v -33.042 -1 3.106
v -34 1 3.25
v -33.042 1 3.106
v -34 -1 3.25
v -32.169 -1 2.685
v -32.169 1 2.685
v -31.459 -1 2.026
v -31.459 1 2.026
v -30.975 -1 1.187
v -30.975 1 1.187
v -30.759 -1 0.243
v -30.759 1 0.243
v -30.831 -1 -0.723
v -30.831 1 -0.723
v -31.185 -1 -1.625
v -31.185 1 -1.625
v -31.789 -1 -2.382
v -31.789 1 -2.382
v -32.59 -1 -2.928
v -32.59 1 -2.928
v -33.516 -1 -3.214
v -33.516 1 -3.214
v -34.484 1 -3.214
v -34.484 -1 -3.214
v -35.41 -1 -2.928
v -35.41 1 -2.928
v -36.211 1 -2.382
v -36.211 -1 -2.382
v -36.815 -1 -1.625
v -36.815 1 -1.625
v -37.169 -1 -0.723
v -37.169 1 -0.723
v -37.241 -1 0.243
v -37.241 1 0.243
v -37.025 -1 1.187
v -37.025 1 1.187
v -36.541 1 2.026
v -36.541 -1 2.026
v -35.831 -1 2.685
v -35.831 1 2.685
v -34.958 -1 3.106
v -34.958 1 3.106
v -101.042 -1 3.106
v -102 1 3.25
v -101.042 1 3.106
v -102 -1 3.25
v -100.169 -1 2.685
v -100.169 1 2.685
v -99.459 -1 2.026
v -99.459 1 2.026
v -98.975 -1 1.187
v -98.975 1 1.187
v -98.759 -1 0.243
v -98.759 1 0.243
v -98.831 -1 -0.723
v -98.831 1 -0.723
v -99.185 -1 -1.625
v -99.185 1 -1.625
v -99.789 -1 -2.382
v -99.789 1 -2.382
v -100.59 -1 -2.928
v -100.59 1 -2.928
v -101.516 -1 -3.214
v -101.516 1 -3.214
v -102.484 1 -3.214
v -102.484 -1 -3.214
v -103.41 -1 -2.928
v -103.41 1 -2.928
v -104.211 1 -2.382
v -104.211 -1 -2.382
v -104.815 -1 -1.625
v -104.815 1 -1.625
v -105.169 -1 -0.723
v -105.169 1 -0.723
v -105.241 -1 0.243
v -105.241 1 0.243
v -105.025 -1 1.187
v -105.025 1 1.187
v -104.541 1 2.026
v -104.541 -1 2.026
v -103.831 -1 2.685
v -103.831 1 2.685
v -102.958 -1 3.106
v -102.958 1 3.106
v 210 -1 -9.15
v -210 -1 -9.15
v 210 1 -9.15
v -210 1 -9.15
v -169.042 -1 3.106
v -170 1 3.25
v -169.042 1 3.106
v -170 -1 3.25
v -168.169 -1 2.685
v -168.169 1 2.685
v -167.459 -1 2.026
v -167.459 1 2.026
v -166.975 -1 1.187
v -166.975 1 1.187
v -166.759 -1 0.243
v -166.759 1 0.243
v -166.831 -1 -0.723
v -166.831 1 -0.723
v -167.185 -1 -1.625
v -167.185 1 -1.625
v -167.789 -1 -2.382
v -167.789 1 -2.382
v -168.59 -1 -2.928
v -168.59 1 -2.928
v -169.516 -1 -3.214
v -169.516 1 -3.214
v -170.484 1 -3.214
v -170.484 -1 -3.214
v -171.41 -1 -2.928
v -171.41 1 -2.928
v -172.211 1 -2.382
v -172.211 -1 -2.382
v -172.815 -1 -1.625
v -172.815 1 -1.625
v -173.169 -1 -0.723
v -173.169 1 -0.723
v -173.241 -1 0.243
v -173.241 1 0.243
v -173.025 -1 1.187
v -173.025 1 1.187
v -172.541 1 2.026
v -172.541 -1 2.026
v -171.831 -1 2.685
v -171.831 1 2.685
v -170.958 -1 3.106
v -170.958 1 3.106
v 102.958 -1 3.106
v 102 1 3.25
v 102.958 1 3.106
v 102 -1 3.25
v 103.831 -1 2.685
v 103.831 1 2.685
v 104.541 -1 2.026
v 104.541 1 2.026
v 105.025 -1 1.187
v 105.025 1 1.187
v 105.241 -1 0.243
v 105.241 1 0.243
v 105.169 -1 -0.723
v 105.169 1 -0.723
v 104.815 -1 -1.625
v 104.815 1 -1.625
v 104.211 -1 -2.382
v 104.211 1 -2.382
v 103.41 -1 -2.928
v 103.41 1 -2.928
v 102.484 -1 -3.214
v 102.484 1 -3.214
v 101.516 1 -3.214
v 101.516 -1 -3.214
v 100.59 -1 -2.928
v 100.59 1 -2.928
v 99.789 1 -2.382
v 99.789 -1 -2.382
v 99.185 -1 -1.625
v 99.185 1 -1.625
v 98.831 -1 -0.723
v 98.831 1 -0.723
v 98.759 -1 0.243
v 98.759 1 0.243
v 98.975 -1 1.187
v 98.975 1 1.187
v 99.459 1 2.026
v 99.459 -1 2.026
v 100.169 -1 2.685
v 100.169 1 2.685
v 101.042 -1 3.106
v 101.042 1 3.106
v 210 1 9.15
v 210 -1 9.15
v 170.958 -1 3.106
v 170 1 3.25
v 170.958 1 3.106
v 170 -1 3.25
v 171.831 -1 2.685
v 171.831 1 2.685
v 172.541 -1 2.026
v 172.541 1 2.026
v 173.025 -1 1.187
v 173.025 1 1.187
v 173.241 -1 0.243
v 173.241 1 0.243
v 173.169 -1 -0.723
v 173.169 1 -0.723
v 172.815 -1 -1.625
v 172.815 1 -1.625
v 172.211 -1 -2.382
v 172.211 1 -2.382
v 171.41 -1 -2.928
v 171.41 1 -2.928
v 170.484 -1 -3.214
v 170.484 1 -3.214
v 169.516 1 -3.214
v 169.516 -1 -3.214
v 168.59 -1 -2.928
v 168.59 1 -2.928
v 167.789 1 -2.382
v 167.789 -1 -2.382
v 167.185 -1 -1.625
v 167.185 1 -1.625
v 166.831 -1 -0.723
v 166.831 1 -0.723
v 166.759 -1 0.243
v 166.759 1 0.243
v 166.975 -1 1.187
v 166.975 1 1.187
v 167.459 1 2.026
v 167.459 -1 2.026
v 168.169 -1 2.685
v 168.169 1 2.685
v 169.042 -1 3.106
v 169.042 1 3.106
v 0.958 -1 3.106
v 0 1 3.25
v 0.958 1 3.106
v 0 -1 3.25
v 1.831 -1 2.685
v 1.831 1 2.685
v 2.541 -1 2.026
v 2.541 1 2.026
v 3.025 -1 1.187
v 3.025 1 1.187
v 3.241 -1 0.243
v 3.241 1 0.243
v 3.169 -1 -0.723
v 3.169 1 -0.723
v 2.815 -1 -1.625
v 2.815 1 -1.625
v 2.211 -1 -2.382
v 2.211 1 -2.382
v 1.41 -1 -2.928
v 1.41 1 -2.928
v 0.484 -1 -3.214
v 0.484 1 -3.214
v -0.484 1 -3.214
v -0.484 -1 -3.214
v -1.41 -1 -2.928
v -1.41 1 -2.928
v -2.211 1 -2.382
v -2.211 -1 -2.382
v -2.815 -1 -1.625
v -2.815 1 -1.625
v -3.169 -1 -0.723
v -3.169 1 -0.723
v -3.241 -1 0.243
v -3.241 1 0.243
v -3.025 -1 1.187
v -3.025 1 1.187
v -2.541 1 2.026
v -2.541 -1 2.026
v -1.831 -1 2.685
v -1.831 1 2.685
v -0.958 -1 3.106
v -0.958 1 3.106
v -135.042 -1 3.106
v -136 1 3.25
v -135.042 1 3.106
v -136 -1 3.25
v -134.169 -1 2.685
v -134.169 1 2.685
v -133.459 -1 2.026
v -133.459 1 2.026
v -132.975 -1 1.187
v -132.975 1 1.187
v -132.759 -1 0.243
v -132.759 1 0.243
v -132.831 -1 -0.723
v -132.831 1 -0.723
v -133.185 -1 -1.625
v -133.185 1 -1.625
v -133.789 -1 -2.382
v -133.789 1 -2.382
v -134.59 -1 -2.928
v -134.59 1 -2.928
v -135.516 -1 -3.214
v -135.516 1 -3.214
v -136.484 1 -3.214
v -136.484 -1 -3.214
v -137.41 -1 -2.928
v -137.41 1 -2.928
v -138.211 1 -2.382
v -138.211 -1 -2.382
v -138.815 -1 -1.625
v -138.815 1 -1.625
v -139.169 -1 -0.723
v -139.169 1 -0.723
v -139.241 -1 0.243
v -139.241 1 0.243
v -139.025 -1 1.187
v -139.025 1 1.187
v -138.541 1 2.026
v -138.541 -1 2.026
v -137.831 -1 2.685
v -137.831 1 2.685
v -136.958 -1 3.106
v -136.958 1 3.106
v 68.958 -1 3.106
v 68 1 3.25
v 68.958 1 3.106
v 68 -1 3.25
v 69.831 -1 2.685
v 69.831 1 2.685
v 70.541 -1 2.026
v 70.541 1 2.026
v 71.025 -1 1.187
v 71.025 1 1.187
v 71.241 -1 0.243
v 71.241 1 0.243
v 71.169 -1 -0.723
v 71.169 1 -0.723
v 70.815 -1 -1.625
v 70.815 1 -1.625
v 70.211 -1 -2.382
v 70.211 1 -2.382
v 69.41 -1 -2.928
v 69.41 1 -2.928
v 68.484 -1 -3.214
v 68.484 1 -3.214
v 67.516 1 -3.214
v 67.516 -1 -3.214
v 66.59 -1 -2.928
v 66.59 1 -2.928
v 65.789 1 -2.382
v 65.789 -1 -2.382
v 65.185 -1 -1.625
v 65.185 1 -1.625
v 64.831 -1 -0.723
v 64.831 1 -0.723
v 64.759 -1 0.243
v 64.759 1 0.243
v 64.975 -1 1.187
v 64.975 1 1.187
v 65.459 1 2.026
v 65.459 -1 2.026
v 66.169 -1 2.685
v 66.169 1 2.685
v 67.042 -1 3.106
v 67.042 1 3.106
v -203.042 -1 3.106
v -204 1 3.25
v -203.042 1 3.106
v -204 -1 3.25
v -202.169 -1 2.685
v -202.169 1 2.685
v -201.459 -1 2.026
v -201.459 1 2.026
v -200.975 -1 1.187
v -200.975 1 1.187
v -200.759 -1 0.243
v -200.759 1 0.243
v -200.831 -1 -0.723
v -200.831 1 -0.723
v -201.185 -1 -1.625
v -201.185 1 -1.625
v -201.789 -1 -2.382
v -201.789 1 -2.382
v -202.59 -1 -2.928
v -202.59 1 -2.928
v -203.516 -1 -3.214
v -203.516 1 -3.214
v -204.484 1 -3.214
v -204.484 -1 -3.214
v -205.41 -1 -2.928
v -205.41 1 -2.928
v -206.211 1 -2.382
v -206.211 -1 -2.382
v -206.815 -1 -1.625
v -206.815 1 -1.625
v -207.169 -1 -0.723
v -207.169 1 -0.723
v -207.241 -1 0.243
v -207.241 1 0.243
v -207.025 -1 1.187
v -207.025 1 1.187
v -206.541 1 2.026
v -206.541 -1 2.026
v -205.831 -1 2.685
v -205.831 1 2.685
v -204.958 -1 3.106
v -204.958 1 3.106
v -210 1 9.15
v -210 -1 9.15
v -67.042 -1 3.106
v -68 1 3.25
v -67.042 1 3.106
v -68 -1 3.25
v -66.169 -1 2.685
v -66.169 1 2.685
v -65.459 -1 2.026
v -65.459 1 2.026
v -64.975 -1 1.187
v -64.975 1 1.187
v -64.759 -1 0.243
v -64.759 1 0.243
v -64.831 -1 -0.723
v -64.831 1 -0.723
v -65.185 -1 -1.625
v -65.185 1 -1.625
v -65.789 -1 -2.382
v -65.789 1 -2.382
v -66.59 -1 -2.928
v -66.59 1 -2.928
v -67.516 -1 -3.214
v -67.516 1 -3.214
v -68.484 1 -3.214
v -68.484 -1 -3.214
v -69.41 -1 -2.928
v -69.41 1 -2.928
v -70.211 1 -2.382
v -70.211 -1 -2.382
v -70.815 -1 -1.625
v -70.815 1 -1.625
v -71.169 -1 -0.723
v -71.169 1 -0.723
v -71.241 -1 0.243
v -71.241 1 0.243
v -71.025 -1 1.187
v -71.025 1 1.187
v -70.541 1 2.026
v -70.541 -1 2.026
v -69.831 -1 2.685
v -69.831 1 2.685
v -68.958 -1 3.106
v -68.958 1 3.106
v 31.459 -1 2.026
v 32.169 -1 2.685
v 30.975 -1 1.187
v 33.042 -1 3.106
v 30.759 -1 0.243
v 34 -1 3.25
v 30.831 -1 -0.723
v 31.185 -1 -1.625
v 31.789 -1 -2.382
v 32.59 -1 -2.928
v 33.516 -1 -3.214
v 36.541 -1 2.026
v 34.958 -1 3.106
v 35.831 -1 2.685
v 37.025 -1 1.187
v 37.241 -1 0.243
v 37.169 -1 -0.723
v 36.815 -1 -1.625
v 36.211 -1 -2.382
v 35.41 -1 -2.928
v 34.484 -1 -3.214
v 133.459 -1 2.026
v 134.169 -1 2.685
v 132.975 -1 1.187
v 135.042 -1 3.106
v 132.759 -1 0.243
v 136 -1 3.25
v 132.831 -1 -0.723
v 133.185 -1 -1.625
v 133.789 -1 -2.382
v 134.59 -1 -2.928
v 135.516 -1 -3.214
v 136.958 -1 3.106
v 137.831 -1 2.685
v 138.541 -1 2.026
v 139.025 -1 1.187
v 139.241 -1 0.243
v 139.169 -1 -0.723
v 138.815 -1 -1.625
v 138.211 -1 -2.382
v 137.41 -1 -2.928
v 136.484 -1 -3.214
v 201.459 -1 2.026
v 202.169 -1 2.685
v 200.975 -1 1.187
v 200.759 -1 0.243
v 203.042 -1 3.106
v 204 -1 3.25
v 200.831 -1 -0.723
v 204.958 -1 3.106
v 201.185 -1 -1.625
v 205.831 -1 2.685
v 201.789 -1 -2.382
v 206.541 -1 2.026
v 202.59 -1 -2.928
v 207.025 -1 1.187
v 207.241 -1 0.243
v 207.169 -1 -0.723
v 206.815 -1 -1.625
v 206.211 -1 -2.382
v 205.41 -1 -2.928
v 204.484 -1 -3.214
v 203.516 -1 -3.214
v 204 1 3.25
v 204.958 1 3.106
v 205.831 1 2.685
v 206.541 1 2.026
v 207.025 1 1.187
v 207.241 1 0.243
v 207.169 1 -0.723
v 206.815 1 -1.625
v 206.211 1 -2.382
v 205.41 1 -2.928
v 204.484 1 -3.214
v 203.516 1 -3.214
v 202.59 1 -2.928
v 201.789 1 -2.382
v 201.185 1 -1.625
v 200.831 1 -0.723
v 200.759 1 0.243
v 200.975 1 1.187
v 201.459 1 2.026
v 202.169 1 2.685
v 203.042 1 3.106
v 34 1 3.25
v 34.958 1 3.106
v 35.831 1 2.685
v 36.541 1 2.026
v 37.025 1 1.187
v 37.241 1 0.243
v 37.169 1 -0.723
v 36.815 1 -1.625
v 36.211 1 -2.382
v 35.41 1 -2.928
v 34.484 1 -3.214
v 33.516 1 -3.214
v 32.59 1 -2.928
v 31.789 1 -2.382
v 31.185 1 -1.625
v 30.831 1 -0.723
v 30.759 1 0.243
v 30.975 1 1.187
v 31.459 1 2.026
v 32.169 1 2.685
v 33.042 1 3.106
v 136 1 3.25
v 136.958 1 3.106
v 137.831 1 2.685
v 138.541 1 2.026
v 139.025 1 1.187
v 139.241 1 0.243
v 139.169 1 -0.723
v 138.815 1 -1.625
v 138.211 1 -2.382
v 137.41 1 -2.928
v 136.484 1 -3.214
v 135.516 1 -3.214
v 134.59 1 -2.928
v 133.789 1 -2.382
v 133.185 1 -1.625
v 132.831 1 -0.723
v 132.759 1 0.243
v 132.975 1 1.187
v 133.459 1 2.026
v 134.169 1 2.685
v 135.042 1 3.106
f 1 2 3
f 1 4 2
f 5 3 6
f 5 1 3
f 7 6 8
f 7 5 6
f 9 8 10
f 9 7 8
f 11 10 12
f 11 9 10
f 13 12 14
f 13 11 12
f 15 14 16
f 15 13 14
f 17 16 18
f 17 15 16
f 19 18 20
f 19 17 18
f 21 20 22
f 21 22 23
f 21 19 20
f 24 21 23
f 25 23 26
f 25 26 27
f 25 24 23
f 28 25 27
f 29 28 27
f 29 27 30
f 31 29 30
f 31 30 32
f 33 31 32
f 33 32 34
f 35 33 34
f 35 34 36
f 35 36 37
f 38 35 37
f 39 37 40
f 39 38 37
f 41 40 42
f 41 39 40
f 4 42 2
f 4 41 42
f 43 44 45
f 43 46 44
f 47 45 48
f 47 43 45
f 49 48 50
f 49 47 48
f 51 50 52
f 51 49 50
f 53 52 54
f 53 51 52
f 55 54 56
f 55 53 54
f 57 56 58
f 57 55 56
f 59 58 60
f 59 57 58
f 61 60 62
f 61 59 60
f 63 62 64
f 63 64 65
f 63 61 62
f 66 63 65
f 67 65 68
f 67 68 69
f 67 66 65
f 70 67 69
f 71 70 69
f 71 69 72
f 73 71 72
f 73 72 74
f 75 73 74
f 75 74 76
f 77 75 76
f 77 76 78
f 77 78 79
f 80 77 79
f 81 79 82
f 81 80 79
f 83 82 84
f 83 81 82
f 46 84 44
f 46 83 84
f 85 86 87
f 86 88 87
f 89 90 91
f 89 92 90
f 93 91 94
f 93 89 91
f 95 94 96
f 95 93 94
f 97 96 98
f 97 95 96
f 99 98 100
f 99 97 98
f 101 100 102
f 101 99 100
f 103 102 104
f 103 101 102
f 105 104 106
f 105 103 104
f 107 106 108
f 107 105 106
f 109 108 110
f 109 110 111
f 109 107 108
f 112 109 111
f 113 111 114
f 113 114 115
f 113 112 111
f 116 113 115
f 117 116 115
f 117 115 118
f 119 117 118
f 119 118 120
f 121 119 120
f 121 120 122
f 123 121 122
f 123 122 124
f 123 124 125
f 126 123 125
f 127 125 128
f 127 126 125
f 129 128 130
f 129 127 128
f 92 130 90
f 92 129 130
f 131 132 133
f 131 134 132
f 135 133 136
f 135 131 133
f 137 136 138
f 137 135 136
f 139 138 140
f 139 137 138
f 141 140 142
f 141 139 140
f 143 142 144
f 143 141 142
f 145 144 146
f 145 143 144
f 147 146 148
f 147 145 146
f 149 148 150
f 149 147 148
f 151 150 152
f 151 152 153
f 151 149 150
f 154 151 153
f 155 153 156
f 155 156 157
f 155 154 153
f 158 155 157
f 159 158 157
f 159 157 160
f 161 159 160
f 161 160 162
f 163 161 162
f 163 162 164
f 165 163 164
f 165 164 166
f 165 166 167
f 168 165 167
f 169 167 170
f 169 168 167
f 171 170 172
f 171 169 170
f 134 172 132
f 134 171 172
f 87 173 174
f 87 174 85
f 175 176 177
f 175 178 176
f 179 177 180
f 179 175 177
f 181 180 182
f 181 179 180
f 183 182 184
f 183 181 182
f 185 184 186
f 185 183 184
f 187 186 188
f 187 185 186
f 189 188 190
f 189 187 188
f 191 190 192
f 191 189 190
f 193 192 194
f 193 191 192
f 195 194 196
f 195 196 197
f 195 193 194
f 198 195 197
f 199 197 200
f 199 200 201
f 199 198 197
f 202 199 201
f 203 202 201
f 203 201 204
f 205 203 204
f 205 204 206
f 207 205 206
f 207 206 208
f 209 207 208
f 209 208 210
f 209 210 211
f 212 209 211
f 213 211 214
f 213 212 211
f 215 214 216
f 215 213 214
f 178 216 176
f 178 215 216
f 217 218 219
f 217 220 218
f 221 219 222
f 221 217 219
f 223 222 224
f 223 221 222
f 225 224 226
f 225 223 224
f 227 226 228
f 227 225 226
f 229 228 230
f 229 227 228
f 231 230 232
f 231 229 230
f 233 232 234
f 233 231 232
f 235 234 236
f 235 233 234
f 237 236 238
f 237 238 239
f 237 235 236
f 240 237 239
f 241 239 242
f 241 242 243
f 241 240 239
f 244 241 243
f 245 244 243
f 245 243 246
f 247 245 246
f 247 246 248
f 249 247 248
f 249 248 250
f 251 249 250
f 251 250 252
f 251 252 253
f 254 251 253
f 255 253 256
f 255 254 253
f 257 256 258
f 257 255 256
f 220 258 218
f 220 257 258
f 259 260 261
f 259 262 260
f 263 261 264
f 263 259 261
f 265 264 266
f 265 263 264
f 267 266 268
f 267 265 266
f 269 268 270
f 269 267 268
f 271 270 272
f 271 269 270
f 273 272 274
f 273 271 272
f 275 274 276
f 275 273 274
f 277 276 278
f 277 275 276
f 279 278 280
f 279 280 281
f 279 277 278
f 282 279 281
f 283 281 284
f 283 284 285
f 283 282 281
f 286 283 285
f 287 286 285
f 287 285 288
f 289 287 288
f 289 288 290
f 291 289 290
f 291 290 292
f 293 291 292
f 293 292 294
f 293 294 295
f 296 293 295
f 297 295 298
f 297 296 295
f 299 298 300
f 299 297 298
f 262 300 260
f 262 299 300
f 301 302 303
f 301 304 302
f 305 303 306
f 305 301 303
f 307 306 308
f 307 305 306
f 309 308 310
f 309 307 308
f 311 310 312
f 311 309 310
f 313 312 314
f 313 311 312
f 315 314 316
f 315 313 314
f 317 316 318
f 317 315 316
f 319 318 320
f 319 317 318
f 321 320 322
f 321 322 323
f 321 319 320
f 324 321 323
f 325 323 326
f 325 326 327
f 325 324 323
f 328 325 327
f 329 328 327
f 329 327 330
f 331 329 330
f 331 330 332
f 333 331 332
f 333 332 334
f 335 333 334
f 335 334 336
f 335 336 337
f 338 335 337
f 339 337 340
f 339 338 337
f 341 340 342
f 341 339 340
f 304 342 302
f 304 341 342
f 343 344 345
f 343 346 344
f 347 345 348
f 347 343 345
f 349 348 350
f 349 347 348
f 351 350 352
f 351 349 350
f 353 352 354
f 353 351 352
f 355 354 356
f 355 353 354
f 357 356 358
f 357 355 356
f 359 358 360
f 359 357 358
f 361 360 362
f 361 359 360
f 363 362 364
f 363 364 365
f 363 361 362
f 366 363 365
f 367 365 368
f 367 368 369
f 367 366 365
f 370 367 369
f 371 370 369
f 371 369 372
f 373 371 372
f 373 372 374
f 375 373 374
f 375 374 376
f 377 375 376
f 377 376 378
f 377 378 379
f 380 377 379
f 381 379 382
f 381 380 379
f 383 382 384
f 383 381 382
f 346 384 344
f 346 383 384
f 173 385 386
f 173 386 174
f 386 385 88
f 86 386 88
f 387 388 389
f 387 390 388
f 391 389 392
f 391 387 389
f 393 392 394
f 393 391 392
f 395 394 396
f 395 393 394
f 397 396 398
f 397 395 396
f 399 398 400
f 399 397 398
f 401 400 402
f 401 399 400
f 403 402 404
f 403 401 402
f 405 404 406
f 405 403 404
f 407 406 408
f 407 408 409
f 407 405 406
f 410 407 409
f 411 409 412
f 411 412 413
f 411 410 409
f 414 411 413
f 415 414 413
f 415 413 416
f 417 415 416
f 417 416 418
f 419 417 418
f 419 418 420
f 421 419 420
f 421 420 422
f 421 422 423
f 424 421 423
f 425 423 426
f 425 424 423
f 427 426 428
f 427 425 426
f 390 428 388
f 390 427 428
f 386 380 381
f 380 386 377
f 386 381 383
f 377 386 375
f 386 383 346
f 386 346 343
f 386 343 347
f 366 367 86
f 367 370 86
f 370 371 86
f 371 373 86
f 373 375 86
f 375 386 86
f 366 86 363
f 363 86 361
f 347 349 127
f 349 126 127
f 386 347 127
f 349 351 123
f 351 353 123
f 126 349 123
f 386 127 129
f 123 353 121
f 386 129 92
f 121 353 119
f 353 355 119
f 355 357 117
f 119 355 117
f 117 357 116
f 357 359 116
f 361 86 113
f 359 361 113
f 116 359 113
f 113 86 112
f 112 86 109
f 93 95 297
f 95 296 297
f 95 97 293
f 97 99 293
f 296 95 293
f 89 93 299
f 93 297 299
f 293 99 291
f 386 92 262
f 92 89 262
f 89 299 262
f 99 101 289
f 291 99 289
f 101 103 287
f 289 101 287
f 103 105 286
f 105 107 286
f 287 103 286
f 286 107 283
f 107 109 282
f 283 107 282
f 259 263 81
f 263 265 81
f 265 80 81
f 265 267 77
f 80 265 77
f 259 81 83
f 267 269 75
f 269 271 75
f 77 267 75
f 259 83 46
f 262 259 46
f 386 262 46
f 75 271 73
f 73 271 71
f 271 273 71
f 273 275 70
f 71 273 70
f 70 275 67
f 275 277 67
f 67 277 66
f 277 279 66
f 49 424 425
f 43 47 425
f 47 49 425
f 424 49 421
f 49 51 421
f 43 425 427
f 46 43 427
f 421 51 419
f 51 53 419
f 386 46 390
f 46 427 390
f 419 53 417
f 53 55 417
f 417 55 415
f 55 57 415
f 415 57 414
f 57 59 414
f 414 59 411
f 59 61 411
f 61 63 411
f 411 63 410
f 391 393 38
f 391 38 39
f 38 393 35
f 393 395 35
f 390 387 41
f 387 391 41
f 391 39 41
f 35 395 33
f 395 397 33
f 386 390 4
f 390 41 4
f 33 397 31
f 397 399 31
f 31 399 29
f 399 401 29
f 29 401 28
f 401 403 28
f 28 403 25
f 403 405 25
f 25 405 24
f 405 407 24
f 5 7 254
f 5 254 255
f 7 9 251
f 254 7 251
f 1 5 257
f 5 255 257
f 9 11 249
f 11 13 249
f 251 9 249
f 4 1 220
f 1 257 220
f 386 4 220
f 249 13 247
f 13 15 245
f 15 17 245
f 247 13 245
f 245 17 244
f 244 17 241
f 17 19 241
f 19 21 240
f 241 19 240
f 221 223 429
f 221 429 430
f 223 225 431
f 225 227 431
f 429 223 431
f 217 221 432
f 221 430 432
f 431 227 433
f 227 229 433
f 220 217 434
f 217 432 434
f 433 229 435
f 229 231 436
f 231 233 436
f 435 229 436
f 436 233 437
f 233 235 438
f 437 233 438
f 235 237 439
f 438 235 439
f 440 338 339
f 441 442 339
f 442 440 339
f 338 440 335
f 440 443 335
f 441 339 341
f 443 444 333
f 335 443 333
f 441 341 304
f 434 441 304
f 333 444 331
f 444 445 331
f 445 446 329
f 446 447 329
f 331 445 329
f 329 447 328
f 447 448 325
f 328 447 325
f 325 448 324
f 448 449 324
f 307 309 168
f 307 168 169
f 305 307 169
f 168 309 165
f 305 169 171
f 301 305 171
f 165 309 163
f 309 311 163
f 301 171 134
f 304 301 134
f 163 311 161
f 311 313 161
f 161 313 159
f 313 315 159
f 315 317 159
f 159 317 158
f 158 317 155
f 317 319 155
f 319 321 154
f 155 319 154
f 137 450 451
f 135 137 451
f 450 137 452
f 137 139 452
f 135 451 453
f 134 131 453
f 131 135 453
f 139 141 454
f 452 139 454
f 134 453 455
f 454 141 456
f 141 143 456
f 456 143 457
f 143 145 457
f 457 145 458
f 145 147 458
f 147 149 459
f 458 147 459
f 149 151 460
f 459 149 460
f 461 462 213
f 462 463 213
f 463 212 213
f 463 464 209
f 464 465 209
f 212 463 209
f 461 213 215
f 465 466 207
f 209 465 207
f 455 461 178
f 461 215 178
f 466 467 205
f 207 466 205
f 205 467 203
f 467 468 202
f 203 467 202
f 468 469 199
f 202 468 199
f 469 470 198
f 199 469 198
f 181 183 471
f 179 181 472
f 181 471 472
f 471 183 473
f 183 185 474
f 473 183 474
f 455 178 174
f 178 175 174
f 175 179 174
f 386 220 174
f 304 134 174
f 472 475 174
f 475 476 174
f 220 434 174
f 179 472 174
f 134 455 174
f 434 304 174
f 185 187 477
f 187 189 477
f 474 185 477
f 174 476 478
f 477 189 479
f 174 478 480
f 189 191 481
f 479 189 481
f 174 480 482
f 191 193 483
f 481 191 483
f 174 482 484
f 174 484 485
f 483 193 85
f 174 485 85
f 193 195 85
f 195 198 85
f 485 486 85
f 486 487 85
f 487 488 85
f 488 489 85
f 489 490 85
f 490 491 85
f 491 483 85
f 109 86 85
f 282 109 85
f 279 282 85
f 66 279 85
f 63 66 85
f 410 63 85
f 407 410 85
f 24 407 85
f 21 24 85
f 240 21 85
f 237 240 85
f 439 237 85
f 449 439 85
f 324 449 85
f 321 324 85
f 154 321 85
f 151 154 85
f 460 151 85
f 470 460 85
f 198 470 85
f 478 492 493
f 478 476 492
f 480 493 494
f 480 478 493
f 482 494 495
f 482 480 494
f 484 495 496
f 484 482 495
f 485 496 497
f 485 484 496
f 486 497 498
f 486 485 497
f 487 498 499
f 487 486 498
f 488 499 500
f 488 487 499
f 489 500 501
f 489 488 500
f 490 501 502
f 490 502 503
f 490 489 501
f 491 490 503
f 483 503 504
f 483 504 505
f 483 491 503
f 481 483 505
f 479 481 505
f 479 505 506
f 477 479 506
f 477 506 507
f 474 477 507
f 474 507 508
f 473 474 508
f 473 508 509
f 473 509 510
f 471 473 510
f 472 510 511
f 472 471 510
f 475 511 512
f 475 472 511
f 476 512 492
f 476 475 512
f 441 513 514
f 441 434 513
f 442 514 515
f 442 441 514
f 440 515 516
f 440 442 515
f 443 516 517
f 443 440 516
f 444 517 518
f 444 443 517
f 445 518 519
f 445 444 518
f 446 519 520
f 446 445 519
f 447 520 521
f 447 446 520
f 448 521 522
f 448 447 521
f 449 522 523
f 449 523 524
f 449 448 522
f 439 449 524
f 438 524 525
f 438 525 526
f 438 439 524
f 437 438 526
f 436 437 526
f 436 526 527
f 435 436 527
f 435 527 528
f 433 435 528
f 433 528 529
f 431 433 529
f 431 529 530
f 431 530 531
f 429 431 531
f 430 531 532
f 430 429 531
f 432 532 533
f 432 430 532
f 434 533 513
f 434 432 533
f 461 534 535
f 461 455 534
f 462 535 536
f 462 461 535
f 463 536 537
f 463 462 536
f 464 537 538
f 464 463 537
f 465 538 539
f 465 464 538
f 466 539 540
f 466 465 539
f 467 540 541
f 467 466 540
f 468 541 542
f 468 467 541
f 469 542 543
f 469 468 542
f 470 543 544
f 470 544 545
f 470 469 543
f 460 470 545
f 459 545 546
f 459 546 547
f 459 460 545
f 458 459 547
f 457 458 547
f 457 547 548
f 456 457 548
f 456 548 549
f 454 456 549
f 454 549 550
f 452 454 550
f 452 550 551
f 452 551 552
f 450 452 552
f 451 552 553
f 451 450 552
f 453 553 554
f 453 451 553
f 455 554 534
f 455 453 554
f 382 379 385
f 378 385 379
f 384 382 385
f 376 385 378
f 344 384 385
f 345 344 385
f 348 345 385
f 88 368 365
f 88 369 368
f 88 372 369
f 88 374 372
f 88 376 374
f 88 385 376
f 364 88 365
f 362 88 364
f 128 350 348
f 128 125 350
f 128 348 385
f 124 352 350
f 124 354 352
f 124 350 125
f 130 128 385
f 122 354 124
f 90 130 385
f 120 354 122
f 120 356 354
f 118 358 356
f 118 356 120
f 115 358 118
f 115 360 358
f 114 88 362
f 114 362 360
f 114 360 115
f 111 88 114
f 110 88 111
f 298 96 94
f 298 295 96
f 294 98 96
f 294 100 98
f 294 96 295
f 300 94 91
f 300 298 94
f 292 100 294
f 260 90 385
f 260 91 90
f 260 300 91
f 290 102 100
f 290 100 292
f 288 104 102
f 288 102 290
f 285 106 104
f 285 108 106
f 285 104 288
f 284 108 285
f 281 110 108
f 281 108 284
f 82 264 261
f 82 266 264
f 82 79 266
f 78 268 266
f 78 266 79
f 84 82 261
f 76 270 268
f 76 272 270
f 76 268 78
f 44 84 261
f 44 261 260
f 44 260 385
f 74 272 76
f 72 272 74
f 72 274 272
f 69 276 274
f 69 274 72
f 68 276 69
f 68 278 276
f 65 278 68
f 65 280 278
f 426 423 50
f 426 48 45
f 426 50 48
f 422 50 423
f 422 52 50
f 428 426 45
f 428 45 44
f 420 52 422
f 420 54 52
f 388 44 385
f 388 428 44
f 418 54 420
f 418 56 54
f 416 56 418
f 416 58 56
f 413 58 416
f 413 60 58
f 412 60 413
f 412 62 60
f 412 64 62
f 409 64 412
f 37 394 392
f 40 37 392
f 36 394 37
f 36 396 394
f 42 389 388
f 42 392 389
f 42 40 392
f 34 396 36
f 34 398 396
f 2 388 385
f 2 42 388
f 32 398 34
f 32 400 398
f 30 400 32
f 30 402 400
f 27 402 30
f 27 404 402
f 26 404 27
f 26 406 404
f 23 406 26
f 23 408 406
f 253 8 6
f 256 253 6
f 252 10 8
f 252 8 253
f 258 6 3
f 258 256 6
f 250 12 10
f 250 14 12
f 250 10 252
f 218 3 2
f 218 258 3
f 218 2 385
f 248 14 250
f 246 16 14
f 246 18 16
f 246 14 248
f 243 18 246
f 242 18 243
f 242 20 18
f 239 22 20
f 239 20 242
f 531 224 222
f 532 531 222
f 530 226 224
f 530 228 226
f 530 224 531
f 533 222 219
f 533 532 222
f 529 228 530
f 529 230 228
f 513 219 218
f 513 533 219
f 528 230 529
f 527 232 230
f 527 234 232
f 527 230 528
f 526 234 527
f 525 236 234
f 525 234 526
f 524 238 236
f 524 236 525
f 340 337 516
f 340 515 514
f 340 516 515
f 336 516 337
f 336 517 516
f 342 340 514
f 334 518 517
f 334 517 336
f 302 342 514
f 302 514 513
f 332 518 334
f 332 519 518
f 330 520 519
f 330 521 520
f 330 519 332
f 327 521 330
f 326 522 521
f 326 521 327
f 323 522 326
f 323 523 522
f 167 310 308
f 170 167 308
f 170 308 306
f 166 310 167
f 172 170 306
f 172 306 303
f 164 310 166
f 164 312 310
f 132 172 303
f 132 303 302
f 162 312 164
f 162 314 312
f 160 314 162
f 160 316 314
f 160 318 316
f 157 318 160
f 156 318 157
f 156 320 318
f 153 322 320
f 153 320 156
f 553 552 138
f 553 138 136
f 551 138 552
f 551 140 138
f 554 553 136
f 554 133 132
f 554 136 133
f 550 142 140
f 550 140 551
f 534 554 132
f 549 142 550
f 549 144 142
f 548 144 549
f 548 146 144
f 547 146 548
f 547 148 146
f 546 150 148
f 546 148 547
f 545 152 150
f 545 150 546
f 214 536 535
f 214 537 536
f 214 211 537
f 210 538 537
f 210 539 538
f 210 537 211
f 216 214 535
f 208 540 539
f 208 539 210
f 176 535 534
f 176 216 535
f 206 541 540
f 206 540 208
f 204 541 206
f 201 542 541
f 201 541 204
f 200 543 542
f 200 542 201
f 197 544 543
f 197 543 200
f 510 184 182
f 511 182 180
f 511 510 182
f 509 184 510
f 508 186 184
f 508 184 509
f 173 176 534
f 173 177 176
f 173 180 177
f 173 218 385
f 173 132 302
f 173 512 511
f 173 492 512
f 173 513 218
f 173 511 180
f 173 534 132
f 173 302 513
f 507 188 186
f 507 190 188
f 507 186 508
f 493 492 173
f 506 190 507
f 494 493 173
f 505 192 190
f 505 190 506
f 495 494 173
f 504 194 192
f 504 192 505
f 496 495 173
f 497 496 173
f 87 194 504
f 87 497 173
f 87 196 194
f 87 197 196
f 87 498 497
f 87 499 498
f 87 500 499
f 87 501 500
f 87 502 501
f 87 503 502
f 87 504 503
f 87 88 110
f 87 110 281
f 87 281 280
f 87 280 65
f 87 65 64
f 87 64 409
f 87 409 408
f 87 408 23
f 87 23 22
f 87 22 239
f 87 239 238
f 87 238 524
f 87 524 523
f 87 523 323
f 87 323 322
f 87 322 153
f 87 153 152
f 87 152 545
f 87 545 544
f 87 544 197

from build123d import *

# Parameters (mm, degrees)
SKETCH1_W           = 420
SKETCH1_H           = 18.3
SKETCH1_R           = 3.25
BOSS_EXTRUDE1_DEPTH = 1


with BuildPart() as part:
    # Sketch1 → Boss-Extrude1 (new, symmetric)
    with BuildSketch(Plane(origin=(0, 0, 0), x_dir=(1, 0, 0), z_dir=(0, 1, 0))):
        Rectangle(SKETCH1_W, SKETCH1_H)
        with Locations(Location((-204, 0, 0), (0, 0, 270))):
            Circle(SKETCH1_R, mode=Mode.SUBTRACT)
        with Locations(Location((-170, 0, 0), (0, 0, 270))):
            Circle(SKETCH1_R, mode=Mode.SUBTRACT)
        with Locations(Location((-136, 0, 0), (0, 0, 270))):
            Circle(SKETCH1_R, mode=Mode.SUBTRACT)
        with Locations(Location((-102, 0, 0), (0, 0, 270))):
            Circle(SKETCH1_R, mode=Mode.SUBTRACT)
        with Locations(Location((-68, 0, 0), (0, 0, 270))):
            Circle(SKETCH1_R, mode=Mode.SUBTRACT)
        with Locations(Location((-34, 0, 0), (0, 0, 270))):
            Circle(SKETCH1_R, mode=Mode.SUBTRACT)
        with Locations(Location((0, 0, 0), (0, 0, 270))):
            Circle(SKETCH1_R, mode=Mode.SUBTRACT)
        with Locations(Location((34, 0, 0), (0, 0, 270))):
            Circle(SKETCH1_R, mode=Mode.SUBTRACT)
        with Locations(Location((68, 0, 0), (0, 0, 270))):
            Circle(SKETCH1_R, mode=Mode.SUBTRACT)
        with Locations(Location((102, 0, 0), (0, 0, 270))):
            Circle(SKETCH1_R, mode=Mode.SUBTRACT)
        with Locations(Location((136, 0, 0), (0, 0, 270))):
            Circle(SKETCH1_R, mode=Mode.SUBTRACT)
        with Locations(Location((170, 0, 0), (0, 0, 270))):
            Circle(SKETCH1_R, mode=Mode.SUBTRACT)
        with Locations(Location((204, 0, 0), (0, 0, 270))):
            Circle(SKETCH1_R, mode=Mode.SUBTRACT)
    extrude(amount=BOSS_EXTRUDE1_DEPTH, both=True)


solid = part.part
